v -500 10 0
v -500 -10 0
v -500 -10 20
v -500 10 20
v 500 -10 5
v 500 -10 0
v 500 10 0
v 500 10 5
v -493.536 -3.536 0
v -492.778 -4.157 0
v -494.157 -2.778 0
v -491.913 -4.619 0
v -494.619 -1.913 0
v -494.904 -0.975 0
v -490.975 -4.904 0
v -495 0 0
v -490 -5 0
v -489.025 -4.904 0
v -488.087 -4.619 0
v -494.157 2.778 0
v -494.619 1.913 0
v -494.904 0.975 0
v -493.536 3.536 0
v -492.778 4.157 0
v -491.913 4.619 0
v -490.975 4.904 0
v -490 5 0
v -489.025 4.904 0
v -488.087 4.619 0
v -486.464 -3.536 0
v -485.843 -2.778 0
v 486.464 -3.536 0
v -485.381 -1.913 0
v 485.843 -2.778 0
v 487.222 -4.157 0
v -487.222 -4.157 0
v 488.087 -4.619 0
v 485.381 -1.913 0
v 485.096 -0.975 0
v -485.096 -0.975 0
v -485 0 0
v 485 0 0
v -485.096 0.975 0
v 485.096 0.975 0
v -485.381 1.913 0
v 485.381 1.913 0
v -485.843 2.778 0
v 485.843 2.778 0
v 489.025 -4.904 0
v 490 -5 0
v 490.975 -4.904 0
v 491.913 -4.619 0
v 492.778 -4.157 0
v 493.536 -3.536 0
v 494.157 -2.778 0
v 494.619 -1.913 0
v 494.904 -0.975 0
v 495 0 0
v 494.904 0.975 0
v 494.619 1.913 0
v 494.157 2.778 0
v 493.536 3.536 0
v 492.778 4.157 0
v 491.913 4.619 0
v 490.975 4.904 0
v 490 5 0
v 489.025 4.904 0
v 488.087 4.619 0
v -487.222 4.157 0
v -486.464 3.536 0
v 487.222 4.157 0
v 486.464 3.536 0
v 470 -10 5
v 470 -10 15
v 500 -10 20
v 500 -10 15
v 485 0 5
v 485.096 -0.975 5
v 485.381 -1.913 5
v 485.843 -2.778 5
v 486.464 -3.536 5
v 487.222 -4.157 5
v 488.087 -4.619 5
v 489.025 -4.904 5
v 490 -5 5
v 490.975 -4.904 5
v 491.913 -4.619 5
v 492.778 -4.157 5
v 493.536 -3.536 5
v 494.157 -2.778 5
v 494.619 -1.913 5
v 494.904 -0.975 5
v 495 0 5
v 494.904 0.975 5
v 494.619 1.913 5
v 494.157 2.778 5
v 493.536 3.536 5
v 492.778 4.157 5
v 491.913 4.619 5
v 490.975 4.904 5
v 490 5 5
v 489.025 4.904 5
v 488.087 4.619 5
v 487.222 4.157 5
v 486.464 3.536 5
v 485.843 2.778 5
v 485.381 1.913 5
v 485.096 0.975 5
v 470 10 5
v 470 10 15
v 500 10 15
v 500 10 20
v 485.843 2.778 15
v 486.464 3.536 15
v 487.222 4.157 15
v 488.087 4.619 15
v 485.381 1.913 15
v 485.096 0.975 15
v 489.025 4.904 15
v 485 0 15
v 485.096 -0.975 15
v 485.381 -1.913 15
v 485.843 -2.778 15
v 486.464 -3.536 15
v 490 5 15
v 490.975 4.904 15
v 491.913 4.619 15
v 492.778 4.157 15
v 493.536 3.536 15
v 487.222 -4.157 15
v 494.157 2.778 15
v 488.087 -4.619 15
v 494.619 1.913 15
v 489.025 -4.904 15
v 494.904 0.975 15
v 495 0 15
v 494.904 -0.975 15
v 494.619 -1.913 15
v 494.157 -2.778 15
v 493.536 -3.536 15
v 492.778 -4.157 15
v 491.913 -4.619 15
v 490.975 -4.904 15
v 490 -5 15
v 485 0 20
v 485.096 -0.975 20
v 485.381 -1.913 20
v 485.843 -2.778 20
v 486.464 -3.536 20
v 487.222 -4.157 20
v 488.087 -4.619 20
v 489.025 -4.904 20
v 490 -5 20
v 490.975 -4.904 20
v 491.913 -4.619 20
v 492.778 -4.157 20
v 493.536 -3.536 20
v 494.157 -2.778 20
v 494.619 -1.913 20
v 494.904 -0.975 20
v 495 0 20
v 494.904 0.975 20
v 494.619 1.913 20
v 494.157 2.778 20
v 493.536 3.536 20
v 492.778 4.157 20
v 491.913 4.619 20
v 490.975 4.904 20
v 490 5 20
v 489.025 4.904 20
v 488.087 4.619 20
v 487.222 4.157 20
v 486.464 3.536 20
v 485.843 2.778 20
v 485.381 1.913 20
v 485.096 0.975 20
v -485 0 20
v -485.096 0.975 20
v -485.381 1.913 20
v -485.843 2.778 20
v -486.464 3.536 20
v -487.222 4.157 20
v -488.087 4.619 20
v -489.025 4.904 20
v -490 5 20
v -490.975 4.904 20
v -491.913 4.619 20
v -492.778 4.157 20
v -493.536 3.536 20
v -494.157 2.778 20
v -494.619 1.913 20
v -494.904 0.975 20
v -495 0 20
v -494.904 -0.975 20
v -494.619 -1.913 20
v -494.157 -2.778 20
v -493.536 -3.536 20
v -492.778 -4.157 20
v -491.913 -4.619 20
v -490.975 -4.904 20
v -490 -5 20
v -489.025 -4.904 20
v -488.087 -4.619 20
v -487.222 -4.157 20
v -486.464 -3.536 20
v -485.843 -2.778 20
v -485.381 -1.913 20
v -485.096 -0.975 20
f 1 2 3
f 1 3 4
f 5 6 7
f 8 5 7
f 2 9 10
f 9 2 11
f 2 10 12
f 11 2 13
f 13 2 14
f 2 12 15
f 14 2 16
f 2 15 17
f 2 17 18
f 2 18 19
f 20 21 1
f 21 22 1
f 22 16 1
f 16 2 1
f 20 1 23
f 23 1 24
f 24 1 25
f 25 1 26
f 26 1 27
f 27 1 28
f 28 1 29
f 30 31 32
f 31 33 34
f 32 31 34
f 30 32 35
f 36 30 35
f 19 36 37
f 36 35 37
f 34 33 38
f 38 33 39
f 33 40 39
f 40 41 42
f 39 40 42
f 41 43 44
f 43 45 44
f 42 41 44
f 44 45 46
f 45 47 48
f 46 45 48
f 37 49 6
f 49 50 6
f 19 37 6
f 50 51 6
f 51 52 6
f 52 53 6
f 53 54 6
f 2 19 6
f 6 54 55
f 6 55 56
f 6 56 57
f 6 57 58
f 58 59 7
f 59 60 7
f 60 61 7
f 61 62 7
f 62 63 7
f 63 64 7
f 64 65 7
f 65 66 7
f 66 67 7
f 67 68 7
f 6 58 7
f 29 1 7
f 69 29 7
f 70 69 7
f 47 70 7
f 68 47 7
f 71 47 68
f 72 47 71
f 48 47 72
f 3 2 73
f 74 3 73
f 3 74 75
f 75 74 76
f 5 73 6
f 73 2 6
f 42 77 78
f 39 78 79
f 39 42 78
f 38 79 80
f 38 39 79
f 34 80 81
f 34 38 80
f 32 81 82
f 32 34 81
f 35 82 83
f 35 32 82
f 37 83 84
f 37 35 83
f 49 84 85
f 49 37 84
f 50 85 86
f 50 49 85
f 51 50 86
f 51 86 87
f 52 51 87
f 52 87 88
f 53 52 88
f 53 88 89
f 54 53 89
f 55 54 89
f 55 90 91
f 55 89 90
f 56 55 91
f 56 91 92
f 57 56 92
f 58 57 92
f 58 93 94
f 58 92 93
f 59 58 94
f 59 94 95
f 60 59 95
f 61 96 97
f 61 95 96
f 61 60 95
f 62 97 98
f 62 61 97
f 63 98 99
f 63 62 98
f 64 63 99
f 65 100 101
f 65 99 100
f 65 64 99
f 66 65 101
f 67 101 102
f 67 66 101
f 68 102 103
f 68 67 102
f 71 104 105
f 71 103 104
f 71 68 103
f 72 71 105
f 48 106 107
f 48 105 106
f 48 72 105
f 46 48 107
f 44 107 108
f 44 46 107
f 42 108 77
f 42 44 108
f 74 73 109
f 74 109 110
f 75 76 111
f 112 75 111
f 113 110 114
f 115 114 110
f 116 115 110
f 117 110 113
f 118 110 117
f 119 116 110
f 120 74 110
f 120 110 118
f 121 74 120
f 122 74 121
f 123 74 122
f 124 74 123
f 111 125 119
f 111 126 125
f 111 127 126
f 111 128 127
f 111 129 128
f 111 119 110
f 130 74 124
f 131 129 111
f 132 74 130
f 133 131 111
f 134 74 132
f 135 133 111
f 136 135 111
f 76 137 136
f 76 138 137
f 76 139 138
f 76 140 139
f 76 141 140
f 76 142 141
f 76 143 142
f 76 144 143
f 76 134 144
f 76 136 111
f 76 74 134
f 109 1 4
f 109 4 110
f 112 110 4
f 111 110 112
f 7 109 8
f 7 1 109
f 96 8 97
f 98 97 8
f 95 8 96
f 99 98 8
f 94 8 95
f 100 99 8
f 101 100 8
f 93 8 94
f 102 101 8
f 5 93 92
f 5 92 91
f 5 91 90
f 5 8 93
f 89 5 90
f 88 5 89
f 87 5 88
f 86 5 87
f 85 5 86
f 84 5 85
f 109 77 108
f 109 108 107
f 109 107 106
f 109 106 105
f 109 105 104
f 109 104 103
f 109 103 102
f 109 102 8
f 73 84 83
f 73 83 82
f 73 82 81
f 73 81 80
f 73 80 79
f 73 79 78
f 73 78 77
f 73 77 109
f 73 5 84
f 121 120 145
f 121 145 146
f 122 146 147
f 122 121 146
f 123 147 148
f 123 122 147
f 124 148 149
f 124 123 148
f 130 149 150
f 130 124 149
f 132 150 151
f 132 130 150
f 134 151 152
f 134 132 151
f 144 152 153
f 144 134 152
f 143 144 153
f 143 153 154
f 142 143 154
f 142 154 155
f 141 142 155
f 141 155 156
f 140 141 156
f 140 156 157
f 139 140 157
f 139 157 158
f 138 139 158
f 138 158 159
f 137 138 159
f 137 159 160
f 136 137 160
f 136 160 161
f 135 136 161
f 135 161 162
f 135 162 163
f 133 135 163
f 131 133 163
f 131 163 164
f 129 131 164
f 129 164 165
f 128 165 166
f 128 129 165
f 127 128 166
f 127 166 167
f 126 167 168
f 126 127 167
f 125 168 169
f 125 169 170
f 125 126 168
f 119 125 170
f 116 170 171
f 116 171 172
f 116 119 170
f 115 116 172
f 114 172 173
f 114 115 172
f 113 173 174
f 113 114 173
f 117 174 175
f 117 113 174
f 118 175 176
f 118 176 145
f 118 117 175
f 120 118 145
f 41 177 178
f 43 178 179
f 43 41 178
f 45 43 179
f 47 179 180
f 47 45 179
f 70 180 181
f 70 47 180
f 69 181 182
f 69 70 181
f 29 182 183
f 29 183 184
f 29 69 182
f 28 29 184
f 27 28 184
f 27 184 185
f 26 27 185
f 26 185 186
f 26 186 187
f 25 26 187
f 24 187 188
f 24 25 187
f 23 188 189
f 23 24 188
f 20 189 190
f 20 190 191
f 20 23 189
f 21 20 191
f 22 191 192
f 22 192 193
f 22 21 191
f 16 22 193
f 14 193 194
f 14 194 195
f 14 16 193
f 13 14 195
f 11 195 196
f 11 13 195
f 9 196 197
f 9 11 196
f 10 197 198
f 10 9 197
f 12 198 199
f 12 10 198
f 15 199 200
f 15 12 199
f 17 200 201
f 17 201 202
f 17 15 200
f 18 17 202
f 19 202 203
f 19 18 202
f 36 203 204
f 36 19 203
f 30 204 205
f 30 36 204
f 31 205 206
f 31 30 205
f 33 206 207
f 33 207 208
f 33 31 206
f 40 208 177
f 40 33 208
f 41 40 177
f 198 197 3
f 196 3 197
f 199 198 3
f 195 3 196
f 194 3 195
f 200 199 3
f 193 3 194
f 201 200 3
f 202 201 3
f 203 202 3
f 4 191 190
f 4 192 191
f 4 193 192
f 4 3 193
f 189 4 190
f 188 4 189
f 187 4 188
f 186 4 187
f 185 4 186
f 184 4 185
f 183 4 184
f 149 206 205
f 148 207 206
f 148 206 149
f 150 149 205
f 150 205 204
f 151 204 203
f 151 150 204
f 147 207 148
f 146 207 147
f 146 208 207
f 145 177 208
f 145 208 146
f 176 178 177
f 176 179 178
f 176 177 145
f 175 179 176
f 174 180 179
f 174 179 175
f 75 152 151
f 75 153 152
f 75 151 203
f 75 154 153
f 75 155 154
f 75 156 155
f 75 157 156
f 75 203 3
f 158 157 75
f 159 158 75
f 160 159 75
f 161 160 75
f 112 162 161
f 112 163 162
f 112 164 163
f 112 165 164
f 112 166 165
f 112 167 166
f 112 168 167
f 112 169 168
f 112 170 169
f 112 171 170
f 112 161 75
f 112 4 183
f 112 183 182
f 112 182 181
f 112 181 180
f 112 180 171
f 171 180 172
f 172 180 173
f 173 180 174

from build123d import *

# Parameters (mm, degrees)
SKETCH_1_W               = 1000
SKETCH_1_H               = 20
SKETCH_1_R               = 5
EXTRUDE_1_DEPTH          = 20
CUT_EXTRUDE_1_DEPTH      = 501.799361022
CUT_EXTRUDE_1_DEPTH_BACK = 20


with BuildPart() as part:
    # Эскиз1 → Бобышка-Вытянуть1 (new body)
    with BuildSketch(Plane.XY):
        Rectangle(SKETCH_1_W, SKETCH_1_H)
        with Locations((-490, 0)):
            Circle(SKETCH_1_R, mode=Mode.SUBTRACT)
        with Locations(Location((490, 0, 0), (0, 0, 180))):
            Circle(SKETCH_1_R, mode=Mode.SUBTRACT)
    extrude(amount=EXTRUDE_1_DEPTH)

    # Эскиз2 → Вырез-Вытянуть1 (cut, two sides: drawn at the far end of the back side and taken through both)
    with BuildSketch(Plane(origin=(0, 10, 0), x_dir=(1, 0, 0), z_dir=(0, 1, 0)).offset(-CUT_EXTRUDE_1_DEPTH_BACK)):
        Polygon((2510.224987345, -5), (500, -5), (470, -5), (470, -15), (500, -15), (2510.224987345, -15), (6530.674962036, -15), (6530.674962036, -5), align=None)
    extrude(amount=CUT_EXTRUDE_1_DEPTH + CUT_EXTRUDE_1_DEPTH_BACK, mode=Mode.SUBTRACT)


solid = part.part
